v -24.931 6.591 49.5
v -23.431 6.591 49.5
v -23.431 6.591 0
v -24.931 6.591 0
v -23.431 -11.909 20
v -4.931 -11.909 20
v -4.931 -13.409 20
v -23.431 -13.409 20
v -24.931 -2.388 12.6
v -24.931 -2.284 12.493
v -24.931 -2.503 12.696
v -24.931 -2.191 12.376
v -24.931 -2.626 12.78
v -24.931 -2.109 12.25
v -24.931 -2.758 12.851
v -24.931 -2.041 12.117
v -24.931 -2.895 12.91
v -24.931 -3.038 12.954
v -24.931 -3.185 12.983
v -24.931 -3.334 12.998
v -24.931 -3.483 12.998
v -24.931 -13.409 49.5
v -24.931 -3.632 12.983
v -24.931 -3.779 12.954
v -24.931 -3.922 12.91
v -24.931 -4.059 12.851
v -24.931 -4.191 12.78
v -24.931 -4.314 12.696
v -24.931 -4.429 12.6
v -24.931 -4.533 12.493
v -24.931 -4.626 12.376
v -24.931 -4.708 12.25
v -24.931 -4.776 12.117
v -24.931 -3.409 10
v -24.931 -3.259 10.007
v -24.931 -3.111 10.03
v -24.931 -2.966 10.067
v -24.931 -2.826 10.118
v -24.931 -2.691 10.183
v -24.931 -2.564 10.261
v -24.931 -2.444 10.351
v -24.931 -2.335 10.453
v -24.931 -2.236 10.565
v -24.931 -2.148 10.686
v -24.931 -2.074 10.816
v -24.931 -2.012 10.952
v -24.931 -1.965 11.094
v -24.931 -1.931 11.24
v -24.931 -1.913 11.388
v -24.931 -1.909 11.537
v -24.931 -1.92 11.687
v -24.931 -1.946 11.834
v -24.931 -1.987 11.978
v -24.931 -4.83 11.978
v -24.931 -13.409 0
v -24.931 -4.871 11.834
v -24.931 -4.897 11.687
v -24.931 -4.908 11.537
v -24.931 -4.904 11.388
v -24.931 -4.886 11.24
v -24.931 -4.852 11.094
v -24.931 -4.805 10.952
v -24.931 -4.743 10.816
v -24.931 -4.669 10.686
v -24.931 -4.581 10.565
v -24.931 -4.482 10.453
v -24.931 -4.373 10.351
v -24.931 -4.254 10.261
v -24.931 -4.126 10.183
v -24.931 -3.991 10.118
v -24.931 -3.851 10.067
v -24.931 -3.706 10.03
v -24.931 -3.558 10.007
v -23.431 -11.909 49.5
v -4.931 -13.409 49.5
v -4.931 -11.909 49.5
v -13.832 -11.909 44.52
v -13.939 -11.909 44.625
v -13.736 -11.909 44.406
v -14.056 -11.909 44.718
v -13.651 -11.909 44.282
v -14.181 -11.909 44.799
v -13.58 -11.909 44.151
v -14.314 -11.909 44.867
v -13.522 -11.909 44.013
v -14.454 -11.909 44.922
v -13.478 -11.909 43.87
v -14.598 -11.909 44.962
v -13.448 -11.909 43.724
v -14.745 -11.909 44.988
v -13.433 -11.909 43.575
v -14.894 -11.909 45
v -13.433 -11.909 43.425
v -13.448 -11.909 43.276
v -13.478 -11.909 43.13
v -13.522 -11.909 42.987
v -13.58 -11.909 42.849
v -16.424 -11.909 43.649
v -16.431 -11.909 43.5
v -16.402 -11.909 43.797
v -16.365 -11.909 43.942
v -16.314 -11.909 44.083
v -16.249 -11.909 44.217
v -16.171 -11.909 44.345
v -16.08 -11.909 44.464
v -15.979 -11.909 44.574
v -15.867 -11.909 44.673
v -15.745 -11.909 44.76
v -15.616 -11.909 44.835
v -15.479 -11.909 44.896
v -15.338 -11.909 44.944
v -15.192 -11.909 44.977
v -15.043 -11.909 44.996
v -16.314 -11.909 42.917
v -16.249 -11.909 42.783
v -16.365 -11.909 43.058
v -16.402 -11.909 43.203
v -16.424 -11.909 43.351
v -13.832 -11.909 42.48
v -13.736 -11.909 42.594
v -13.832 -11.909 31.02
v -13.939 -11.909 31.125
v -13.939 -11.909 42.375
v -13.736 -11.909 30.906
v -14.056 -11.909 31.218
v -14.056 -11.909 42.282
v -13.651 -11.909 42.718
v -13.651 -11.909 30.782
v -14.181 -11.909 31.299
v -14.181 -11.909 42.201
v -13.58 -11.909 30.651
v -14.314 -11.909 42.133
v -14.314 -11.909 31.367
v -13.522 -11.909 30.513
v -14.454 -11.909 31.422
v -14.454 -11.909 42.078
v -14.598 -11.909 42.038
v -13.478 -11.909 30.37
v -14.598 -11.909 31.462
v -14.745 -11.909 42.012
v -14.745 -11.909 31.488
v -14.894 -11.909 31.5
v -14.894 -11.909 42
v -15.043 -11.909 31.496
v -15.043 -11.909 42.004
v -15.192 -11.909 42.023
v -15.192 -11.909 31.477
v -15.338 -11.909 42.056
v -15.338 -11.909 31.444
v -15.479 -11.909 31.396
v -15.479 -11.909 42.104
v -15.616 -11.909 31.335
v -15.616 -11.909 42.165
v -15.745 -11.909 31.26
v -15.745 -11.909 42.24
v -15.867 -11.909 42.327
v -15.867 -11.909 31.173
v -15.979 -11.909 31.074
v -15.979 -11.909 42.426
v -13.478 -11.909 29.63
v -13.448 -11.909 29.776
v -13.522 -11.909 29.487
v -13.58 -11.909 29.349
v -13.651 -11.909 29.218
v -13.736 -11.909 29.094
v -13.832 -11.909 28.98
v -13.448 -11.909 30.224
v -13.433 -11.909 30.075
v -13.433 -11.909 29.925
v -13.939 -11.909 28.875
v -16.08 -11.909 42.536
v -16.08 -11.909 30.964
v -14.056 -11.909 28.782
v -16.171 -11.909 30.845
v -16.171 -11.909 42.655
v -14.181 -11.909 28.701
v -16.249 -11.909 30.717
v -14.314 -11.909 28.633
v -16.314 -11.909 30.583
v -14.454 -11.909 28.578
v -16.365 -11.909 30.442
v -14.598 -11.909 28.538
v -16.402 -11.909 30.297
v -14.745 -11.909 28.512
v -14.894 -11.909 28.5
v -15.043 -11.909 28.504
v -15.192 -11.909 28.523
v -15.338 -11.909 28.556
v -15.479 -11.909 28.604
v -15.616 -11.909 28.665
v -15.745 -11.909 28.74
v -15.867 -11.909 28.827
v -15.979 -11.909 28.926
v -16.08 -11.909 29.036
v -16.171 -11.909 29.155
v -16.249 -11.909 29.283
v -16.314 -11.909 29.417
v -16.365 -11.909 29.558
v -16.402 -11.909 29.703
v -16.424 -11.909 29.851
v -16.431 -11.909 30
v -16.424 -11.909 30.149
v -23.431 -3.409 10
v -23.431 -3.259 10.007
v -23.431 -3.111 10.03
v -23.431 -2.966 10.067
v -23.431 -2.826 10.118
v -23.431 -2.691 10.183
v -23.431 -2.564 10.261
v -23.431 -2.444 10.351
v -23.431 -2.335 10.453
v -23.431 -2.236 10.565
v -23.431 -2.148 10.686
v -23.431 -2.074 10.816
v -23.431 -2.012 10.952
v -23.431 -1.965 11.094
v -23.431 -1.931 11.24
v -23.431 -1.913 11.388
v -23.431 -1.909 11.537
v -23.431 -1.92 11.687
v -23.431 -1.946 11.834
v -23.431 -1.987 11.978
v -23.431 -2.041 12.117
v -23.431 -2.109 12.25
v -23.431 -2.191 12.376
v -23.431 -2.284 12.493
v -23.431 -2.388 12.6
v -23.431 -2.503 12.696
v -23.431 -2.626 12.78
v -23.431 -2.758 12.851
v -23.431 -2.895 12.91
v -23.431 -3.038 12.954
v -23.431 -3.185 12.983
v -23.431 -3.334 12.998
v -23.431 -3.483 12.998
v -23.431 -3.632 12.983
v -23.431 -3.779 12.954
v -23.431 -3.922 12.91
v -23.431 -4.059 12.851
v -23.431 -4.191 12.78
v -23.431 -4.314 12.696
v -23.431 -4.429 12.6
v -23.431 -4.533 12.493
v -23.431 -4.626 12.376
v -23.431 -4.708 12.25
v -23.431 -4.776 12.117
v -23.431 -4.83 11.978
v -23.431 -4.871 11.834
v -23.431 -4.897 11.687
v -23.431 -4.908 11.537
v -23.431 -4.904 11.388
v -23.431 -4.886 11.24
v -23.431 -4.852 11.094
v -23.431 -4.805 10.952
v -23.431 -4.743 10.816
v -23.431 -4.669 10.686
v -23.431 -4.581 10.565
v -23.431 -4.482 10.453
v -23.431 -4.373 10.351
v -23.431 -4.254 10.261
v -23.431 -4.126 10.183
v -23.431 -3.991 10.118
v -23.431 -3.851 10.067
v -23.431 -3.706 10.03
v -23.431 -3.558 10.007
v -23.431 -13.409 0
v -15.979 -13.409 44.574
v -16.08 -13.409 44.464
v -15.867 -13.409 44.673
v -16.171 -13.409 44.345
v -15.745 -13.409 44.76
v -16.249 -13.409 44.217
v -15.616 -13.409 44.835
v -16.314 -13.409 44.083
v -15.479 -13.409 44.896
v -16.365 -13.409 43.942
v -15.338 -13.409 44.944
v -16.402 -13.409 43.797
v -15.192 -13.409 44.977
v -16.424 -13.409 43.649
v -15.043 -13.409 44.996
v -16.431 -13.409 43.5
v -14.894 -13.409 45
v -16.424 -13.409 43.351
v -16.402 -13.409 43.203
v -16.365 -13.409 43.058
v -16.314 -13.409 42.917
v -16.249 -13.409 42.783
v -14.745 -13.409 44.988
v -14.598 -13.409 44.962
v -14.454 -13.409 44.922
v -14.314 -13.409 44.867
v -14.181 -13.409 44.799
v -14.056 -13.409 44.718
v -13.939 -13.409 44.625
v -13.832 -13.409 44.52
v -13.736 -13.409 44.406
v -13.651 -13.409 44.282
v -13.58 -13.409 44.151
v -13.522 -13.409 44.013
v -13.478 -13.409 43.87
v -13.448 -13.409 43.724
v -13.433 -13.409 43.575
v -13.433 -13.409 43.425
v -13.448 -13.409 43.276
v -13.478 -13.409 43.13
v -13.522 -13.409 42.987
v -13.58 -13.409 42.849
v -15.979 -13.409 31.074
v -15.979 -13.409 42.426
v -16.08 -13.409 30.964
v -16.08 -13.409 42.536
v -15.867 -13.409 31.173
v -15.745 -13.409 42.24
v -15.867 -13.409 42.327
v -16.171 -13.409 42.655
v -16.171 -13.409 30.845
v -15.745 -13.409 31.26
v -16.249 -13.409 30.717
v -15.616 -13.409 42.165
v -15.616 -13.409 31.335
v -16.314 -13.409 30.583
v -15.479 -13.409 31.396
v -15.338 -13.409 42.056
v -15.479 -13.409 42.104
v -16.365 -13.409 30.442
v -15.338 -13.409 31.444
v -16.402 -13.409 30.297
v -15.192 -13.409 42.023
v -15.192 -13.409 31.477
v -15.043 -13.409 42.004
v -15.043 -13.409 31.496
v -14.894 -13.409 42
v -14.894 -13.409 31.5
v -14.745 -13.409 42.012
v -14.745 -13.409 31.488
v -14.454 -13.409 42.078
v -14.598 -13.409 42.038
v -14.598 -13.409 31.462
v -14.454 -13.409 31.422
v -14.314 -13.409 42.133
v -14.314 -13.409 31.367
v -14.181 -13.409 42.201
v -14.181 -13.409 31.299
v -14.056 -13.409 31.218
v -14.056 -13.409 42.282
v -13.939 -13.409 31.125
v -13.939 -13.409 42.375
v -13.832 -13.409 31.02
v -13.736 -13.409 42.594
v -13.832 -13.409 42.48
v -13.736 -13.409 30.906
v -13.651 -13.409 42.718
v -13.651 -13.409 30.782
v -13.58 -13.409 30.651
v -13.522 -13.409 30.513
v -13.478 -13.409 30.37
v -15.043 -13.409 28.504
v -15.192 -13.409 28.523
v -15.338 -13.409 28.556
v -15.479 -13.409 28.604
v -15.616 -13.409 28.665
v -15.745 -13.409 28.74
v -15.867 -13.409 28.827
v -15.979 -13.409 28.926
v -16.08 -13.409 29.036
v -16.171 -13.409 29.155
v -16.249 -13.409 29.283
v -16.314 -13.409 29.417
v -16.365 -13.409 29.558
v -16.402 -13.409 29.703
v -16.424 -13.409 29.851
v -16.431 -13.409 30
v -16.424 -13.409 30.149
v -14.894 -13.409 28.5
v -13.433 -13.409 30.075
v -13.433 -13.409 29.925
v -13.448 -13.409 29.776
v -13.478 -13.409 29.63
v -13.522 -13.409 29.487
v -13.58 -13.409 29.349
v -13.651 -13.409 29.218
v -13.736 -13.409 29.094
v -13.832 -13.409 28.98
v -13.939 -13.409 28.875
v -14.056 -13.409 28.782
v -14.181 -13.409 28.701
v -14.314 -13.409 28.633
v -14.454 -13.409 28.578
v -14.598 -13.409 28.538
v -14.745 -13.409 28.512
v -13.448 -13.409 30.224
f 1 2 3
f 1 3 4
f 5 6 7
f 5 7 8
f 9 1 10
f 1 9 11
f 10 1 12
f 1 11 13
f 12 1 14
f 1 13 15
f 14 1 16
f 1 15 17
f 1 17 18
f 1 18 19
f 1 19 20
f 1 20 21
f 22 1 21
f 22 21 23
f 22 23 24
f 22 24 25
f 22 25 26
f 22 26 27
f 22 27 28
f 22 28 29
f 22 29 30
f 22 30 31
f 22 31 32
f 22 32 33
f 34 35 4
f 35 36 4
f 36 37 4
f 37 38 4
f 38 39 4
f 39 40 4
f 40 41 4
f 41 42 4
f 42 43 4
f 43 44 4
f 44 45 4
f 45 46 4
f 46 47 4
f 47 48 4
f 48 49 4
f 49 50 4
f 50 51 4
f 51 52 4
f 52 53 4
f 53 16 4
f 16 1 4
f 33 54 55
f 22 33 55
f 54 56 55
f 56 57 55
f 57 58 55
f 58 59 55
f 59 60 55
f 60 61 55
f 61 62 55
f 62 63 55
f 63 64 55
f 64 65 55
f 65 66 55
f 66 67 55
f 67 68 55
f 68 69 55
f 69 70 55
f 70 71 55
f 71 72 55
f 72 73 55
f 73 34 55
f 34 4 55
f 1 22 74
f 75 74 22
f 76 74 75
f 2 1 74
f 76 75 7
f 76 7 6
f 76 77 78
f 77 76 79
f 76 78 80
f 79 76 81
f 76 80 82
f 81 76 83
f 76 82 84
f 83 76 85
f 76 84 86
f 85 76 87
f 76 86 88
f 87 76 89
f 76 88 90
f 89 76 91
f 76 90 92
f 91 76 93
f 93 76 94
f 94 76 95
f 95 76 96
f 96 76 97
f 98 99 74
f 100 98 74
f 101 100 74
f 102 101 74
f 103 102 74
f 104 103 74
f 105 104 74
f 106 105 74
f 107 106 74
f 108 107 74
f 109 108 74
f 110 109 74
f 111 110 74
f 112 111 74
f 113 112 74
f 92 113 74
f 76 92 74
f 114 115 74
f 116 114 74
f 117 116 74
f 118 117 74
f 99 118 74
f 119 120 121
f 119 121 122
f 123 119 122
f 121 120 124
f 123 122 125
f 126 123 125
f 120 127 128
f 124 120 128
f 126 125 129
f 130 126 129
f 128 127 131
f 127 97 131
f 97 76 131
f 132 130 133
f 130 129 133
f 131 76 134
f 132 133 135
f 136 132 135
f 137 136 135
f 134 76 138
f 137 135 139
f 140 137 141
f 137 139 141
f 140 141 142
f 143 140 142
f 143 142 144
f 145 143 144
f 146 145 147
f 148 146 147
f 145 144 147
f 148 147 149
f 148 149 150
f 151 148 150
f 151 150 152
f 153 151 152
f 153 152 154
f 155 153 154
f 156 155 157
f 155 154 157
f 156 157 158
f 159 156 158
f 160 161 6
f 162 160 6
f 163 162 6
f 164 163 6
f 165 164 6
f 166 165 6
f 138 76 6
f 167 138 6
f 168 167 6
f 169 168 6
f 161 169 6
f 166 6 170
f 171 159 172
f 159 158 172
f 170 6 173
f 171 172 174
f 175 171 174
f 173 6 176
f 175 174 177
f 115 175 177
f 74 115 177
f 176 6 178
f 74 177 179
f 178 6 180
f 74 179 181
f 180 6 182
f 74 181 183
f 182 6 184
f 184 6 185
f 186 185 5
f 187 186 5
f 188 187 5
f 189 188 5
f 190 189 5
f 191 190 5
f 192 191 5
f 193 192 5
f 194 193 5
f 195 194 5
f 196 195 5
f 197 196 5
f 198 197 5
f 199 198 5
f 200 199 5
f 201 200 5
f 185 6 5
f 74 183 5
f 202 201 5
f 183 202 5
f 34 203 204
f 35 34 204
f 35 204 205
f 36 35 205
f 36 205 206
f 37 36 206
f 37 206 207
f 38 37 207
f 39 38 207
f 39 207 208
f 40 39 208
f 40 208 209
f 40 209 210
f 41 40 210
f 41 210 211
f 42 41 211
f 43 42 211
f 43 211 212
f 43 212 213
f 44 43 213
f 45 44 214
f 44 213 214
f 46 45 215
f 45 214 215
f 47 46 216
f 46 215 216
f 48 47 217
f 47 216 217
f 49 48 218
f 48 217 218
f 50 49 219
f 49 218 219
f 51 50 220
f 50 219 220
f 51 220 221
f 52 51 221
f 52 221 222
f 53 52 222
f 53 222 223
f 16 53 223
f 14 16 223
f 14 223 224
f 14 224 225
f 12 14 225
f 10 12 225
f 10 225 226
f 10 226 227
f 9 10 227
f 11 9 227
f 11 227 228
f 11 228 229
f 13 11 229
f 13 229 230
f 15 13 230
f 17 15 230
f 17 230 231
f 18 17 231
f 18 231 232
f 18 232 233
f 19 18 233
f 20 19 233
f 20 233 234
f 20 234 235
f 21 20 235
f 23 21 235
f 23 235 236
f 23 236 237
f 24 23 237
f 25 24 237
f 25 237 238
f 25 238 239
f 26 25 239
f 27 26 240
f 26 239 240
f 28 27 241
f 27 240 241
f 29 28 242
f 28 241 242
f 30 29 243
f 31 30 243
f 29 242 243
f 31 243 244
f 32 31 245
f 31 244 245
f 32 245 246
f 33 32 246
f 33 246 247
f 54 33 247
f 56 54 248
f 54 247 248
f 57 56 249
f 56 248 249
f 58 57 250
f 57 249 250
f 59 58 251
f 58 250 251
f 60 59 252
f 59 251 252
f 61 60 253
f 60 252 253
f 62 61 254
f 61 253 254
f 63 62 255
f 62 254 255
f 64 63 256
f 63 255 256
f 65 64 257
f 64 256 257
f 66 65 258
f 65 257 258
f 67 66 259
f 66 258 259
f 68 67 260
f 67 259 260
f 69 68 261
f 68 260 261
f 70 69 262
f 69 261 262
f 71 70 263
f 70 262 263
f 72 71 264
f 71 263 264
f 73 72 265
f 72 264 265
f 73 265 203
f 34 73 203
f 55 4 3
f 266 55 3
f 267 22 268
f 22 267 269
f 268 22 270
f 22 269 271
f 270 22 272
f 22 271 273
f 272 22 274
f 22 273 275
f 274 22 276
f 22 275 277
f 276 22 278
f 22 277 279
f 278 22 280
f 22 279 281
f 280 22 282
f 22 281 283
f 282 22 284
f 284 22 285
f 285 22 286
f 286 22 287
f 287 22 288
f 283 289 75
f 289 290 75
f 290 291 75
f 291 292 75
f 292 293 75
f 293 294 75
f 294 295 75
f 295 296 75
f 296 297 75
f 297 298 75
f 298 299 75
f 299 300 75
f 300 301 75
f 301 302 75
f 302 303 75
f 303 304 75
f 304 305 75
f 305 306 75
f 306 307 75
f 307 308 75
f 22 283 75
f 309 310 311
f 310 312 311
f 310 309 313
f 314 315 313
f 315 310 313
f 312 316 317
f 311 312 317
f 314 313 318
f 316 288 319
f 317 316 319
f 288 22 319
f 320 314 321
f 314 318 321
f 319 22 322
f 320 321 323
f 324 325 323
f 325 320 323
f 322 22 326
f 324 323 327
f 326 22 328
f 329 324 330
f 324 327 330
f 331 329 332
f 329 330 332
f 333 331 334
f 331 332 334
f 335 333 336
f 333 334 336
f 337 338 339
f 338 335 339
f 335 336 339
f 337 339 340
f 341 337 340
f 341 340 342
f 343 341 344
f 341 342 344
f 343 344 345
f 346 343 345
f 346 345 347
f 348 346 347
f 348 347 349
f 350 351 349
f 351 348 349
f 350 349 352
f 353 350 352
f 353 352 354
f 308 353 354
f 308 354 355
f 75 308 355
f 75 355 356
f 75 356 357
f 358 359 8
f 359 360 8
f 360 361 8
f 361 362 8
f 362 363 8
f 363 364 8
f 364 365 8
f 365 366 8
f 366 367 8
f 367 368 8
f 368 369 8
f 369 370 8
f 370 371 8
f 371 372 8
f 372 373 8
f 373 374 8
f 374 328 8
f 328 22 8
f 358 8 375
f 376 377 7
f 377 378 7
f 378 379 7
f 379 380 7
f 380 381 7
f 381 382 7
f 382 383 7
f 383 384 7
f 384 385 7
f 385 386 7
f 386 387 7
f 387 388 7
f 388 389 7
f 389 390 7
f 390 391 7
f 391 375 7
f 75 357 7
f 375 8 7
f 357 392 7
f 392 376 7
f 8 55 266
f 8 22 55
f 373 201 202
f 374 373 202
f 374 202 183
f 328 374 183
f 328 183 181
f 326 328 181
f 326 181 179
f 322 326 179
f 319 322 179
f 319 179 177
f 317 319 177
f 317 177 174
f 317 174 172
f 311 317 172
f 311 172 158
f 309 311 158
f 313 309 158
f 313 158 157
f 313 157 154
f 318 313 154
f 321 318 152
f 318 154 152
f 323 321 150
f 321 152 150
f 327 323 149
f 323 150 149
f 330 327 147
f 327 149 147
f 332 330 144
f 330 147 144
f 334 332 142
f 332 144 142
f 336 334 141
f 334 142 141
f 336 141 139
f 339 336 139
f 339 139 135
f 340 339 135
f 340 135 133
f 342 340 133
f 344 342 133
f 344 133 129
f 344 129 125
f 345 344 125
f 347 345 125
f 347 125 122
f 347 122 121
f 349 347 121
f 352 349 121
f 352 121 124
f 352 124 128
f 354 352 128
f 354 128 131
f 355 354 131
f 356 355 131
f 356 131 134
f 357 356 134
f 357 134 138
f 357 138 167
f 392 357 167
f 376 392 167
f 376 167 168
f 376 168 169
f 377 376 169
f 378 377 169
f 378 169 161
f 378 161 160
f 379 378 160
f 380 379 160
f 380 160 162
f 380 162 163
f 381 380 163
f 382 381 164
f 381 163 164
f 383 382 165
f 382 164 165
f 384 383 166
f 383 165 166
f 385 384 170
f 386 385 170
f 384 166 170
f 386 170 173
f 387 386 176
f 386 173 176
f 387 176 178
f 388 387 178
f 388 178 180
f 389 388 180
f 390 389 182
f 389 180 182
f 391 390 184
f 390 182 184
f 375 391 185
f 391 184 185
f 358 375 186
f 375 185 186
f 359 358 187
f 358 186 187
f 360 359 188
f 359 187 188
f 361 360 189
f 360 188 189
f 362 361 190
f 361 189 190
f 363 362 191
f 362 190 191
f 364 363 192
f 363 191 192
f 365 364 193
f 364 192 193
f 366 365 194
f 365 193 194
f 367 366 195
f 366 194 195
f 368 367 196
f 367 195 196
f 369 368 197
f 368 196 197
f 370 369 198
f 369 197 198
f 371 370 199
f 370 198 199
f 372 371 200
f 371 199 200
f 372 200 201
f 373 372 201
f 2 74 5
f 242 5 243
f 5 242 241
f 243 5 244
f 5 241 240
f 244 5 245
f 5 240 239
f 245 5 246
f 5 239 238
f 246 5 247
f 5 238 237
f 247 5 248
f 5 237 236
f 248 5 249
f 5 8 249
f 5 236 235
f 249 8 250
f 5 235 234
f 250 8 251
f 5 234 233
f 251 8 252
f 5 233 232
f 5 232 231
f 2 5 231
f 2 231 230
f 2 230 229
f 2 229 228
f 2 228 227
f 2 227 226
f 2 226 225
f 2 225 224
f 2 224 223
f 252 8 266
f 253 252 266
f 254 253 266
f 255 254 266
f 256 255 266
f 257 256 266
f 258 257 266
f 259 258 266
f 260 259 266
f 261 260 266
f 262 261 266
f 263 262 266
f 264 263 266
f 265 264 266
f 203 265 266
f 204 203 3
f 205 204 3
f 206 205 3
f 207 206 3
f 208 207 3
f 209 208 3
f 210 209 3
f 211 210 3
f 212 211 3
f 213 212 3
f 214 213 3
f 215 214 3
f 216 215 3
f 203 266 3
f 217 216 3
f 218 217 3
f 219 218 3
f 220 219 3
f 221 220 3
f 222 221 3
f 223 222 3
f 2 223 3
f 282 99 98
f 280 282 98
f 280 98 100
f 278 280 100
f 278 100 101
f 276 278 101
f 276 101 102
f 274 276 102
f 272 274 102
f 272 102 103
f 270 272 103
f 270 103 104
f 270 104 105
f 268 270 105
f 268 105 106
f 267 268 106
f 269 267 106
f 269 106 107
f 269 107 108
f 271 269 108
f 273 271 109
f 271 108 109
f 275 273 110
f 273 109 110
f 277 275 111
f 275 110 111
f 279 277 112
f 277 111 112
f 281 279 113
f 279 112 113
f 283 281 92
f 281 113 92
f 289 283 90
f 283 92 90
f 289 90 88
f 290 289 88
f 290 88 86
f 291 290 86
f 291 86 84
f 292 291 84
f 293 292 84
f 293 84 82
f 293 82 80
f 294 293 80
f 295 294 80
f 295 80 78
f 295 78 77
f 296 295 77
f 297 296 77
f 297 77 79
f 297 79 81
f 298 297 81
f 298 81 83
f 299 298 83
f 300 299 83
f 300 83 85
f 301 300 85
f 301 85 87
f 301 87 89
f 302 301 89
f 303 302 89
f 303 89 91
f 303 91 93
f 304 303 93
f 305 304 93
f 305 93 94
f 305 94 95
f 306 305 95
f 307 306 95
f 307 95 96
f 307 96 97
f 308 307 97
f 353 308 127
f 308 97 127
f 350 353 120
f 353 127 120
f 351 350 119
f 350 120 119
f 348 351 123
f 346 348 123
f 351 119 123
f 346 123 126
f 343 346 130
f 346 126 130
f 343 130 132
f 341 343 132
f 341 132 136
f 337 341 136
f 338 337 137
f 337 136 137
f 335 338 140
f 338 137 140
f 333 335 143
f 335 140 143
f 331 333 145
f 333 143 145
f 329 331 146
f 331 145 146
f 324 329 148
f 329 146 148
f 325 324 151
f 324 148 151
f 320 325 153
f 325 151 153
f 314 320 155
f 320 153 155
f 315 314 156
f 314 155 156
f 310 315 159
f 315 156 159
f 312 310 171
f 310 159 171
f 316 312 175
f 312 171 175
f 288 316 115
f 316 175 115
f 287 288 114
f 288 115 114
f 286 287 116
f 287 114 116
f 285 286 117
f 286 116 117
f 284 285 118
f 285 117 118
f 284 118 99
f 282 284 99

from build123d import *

# Parameters (mm, degrees)
EXTRUSION1_DEPTH = 49.5
ESQUISSE2_R      = 1.5
ESQUISSE2_W      = 18.5
ESQUISSE2_H      = 20
EXTRUSION2_DEPTH = 100
ESQUISSE3_R      = 1.5
EXTRUSION3_DEPTH = 100


with BuildPart() as part:
    # Esquisse1 → Extrusion1 (new body)
    with BuildSketch(Plane.XY):
        Polygon((-24.93137059, 6.591473684), (-24.93137059, -13.408526316), (-4.93137059, -13.408526316), (-4.93137059, -11.908526316), (-23.43137059, -11.908526316), (-23.43137059, 6.591473684), align=None)
    extrude(amount=EXTRUSION1_DEPTH)

    # Esquisse2 → Extrusion2 (cut)
    with BuildSketch(Plane(origin=(0, -11.908526316, 0), x_dir=(-1, 0, 0), z_dir=(0, 1, 0))):
        with Locations((14.93137059, 43.5)):
            Circle(ESQUISSE2_R)
        with Locations((14.93137059, 30)):
            Circle(ESQUISSE2_R)
        with Locations((14.18137059, 10)):
            Rectangle(ESQUISSE2_W, ESQUISSE2_H)
    extrude(amount=-EXTRUSION2_DEPTH, mode=Mode.SUBTRACT)

    # Esquisse3 → Extrusion3 (cut)
    with BuildSketch(Plane(origin=(-23.43137059, 0, 0), x_dir=(0, 0, -1), z_dir=(1, 0, 0))):
        with Locations((-11.5, -3.408526316)):
            Circle(ESQUISSE3_R)
    extrude(amount=-EXTRUSION3_DEPTH, mode=Mode.SUBTRACT)


solid = part.part
